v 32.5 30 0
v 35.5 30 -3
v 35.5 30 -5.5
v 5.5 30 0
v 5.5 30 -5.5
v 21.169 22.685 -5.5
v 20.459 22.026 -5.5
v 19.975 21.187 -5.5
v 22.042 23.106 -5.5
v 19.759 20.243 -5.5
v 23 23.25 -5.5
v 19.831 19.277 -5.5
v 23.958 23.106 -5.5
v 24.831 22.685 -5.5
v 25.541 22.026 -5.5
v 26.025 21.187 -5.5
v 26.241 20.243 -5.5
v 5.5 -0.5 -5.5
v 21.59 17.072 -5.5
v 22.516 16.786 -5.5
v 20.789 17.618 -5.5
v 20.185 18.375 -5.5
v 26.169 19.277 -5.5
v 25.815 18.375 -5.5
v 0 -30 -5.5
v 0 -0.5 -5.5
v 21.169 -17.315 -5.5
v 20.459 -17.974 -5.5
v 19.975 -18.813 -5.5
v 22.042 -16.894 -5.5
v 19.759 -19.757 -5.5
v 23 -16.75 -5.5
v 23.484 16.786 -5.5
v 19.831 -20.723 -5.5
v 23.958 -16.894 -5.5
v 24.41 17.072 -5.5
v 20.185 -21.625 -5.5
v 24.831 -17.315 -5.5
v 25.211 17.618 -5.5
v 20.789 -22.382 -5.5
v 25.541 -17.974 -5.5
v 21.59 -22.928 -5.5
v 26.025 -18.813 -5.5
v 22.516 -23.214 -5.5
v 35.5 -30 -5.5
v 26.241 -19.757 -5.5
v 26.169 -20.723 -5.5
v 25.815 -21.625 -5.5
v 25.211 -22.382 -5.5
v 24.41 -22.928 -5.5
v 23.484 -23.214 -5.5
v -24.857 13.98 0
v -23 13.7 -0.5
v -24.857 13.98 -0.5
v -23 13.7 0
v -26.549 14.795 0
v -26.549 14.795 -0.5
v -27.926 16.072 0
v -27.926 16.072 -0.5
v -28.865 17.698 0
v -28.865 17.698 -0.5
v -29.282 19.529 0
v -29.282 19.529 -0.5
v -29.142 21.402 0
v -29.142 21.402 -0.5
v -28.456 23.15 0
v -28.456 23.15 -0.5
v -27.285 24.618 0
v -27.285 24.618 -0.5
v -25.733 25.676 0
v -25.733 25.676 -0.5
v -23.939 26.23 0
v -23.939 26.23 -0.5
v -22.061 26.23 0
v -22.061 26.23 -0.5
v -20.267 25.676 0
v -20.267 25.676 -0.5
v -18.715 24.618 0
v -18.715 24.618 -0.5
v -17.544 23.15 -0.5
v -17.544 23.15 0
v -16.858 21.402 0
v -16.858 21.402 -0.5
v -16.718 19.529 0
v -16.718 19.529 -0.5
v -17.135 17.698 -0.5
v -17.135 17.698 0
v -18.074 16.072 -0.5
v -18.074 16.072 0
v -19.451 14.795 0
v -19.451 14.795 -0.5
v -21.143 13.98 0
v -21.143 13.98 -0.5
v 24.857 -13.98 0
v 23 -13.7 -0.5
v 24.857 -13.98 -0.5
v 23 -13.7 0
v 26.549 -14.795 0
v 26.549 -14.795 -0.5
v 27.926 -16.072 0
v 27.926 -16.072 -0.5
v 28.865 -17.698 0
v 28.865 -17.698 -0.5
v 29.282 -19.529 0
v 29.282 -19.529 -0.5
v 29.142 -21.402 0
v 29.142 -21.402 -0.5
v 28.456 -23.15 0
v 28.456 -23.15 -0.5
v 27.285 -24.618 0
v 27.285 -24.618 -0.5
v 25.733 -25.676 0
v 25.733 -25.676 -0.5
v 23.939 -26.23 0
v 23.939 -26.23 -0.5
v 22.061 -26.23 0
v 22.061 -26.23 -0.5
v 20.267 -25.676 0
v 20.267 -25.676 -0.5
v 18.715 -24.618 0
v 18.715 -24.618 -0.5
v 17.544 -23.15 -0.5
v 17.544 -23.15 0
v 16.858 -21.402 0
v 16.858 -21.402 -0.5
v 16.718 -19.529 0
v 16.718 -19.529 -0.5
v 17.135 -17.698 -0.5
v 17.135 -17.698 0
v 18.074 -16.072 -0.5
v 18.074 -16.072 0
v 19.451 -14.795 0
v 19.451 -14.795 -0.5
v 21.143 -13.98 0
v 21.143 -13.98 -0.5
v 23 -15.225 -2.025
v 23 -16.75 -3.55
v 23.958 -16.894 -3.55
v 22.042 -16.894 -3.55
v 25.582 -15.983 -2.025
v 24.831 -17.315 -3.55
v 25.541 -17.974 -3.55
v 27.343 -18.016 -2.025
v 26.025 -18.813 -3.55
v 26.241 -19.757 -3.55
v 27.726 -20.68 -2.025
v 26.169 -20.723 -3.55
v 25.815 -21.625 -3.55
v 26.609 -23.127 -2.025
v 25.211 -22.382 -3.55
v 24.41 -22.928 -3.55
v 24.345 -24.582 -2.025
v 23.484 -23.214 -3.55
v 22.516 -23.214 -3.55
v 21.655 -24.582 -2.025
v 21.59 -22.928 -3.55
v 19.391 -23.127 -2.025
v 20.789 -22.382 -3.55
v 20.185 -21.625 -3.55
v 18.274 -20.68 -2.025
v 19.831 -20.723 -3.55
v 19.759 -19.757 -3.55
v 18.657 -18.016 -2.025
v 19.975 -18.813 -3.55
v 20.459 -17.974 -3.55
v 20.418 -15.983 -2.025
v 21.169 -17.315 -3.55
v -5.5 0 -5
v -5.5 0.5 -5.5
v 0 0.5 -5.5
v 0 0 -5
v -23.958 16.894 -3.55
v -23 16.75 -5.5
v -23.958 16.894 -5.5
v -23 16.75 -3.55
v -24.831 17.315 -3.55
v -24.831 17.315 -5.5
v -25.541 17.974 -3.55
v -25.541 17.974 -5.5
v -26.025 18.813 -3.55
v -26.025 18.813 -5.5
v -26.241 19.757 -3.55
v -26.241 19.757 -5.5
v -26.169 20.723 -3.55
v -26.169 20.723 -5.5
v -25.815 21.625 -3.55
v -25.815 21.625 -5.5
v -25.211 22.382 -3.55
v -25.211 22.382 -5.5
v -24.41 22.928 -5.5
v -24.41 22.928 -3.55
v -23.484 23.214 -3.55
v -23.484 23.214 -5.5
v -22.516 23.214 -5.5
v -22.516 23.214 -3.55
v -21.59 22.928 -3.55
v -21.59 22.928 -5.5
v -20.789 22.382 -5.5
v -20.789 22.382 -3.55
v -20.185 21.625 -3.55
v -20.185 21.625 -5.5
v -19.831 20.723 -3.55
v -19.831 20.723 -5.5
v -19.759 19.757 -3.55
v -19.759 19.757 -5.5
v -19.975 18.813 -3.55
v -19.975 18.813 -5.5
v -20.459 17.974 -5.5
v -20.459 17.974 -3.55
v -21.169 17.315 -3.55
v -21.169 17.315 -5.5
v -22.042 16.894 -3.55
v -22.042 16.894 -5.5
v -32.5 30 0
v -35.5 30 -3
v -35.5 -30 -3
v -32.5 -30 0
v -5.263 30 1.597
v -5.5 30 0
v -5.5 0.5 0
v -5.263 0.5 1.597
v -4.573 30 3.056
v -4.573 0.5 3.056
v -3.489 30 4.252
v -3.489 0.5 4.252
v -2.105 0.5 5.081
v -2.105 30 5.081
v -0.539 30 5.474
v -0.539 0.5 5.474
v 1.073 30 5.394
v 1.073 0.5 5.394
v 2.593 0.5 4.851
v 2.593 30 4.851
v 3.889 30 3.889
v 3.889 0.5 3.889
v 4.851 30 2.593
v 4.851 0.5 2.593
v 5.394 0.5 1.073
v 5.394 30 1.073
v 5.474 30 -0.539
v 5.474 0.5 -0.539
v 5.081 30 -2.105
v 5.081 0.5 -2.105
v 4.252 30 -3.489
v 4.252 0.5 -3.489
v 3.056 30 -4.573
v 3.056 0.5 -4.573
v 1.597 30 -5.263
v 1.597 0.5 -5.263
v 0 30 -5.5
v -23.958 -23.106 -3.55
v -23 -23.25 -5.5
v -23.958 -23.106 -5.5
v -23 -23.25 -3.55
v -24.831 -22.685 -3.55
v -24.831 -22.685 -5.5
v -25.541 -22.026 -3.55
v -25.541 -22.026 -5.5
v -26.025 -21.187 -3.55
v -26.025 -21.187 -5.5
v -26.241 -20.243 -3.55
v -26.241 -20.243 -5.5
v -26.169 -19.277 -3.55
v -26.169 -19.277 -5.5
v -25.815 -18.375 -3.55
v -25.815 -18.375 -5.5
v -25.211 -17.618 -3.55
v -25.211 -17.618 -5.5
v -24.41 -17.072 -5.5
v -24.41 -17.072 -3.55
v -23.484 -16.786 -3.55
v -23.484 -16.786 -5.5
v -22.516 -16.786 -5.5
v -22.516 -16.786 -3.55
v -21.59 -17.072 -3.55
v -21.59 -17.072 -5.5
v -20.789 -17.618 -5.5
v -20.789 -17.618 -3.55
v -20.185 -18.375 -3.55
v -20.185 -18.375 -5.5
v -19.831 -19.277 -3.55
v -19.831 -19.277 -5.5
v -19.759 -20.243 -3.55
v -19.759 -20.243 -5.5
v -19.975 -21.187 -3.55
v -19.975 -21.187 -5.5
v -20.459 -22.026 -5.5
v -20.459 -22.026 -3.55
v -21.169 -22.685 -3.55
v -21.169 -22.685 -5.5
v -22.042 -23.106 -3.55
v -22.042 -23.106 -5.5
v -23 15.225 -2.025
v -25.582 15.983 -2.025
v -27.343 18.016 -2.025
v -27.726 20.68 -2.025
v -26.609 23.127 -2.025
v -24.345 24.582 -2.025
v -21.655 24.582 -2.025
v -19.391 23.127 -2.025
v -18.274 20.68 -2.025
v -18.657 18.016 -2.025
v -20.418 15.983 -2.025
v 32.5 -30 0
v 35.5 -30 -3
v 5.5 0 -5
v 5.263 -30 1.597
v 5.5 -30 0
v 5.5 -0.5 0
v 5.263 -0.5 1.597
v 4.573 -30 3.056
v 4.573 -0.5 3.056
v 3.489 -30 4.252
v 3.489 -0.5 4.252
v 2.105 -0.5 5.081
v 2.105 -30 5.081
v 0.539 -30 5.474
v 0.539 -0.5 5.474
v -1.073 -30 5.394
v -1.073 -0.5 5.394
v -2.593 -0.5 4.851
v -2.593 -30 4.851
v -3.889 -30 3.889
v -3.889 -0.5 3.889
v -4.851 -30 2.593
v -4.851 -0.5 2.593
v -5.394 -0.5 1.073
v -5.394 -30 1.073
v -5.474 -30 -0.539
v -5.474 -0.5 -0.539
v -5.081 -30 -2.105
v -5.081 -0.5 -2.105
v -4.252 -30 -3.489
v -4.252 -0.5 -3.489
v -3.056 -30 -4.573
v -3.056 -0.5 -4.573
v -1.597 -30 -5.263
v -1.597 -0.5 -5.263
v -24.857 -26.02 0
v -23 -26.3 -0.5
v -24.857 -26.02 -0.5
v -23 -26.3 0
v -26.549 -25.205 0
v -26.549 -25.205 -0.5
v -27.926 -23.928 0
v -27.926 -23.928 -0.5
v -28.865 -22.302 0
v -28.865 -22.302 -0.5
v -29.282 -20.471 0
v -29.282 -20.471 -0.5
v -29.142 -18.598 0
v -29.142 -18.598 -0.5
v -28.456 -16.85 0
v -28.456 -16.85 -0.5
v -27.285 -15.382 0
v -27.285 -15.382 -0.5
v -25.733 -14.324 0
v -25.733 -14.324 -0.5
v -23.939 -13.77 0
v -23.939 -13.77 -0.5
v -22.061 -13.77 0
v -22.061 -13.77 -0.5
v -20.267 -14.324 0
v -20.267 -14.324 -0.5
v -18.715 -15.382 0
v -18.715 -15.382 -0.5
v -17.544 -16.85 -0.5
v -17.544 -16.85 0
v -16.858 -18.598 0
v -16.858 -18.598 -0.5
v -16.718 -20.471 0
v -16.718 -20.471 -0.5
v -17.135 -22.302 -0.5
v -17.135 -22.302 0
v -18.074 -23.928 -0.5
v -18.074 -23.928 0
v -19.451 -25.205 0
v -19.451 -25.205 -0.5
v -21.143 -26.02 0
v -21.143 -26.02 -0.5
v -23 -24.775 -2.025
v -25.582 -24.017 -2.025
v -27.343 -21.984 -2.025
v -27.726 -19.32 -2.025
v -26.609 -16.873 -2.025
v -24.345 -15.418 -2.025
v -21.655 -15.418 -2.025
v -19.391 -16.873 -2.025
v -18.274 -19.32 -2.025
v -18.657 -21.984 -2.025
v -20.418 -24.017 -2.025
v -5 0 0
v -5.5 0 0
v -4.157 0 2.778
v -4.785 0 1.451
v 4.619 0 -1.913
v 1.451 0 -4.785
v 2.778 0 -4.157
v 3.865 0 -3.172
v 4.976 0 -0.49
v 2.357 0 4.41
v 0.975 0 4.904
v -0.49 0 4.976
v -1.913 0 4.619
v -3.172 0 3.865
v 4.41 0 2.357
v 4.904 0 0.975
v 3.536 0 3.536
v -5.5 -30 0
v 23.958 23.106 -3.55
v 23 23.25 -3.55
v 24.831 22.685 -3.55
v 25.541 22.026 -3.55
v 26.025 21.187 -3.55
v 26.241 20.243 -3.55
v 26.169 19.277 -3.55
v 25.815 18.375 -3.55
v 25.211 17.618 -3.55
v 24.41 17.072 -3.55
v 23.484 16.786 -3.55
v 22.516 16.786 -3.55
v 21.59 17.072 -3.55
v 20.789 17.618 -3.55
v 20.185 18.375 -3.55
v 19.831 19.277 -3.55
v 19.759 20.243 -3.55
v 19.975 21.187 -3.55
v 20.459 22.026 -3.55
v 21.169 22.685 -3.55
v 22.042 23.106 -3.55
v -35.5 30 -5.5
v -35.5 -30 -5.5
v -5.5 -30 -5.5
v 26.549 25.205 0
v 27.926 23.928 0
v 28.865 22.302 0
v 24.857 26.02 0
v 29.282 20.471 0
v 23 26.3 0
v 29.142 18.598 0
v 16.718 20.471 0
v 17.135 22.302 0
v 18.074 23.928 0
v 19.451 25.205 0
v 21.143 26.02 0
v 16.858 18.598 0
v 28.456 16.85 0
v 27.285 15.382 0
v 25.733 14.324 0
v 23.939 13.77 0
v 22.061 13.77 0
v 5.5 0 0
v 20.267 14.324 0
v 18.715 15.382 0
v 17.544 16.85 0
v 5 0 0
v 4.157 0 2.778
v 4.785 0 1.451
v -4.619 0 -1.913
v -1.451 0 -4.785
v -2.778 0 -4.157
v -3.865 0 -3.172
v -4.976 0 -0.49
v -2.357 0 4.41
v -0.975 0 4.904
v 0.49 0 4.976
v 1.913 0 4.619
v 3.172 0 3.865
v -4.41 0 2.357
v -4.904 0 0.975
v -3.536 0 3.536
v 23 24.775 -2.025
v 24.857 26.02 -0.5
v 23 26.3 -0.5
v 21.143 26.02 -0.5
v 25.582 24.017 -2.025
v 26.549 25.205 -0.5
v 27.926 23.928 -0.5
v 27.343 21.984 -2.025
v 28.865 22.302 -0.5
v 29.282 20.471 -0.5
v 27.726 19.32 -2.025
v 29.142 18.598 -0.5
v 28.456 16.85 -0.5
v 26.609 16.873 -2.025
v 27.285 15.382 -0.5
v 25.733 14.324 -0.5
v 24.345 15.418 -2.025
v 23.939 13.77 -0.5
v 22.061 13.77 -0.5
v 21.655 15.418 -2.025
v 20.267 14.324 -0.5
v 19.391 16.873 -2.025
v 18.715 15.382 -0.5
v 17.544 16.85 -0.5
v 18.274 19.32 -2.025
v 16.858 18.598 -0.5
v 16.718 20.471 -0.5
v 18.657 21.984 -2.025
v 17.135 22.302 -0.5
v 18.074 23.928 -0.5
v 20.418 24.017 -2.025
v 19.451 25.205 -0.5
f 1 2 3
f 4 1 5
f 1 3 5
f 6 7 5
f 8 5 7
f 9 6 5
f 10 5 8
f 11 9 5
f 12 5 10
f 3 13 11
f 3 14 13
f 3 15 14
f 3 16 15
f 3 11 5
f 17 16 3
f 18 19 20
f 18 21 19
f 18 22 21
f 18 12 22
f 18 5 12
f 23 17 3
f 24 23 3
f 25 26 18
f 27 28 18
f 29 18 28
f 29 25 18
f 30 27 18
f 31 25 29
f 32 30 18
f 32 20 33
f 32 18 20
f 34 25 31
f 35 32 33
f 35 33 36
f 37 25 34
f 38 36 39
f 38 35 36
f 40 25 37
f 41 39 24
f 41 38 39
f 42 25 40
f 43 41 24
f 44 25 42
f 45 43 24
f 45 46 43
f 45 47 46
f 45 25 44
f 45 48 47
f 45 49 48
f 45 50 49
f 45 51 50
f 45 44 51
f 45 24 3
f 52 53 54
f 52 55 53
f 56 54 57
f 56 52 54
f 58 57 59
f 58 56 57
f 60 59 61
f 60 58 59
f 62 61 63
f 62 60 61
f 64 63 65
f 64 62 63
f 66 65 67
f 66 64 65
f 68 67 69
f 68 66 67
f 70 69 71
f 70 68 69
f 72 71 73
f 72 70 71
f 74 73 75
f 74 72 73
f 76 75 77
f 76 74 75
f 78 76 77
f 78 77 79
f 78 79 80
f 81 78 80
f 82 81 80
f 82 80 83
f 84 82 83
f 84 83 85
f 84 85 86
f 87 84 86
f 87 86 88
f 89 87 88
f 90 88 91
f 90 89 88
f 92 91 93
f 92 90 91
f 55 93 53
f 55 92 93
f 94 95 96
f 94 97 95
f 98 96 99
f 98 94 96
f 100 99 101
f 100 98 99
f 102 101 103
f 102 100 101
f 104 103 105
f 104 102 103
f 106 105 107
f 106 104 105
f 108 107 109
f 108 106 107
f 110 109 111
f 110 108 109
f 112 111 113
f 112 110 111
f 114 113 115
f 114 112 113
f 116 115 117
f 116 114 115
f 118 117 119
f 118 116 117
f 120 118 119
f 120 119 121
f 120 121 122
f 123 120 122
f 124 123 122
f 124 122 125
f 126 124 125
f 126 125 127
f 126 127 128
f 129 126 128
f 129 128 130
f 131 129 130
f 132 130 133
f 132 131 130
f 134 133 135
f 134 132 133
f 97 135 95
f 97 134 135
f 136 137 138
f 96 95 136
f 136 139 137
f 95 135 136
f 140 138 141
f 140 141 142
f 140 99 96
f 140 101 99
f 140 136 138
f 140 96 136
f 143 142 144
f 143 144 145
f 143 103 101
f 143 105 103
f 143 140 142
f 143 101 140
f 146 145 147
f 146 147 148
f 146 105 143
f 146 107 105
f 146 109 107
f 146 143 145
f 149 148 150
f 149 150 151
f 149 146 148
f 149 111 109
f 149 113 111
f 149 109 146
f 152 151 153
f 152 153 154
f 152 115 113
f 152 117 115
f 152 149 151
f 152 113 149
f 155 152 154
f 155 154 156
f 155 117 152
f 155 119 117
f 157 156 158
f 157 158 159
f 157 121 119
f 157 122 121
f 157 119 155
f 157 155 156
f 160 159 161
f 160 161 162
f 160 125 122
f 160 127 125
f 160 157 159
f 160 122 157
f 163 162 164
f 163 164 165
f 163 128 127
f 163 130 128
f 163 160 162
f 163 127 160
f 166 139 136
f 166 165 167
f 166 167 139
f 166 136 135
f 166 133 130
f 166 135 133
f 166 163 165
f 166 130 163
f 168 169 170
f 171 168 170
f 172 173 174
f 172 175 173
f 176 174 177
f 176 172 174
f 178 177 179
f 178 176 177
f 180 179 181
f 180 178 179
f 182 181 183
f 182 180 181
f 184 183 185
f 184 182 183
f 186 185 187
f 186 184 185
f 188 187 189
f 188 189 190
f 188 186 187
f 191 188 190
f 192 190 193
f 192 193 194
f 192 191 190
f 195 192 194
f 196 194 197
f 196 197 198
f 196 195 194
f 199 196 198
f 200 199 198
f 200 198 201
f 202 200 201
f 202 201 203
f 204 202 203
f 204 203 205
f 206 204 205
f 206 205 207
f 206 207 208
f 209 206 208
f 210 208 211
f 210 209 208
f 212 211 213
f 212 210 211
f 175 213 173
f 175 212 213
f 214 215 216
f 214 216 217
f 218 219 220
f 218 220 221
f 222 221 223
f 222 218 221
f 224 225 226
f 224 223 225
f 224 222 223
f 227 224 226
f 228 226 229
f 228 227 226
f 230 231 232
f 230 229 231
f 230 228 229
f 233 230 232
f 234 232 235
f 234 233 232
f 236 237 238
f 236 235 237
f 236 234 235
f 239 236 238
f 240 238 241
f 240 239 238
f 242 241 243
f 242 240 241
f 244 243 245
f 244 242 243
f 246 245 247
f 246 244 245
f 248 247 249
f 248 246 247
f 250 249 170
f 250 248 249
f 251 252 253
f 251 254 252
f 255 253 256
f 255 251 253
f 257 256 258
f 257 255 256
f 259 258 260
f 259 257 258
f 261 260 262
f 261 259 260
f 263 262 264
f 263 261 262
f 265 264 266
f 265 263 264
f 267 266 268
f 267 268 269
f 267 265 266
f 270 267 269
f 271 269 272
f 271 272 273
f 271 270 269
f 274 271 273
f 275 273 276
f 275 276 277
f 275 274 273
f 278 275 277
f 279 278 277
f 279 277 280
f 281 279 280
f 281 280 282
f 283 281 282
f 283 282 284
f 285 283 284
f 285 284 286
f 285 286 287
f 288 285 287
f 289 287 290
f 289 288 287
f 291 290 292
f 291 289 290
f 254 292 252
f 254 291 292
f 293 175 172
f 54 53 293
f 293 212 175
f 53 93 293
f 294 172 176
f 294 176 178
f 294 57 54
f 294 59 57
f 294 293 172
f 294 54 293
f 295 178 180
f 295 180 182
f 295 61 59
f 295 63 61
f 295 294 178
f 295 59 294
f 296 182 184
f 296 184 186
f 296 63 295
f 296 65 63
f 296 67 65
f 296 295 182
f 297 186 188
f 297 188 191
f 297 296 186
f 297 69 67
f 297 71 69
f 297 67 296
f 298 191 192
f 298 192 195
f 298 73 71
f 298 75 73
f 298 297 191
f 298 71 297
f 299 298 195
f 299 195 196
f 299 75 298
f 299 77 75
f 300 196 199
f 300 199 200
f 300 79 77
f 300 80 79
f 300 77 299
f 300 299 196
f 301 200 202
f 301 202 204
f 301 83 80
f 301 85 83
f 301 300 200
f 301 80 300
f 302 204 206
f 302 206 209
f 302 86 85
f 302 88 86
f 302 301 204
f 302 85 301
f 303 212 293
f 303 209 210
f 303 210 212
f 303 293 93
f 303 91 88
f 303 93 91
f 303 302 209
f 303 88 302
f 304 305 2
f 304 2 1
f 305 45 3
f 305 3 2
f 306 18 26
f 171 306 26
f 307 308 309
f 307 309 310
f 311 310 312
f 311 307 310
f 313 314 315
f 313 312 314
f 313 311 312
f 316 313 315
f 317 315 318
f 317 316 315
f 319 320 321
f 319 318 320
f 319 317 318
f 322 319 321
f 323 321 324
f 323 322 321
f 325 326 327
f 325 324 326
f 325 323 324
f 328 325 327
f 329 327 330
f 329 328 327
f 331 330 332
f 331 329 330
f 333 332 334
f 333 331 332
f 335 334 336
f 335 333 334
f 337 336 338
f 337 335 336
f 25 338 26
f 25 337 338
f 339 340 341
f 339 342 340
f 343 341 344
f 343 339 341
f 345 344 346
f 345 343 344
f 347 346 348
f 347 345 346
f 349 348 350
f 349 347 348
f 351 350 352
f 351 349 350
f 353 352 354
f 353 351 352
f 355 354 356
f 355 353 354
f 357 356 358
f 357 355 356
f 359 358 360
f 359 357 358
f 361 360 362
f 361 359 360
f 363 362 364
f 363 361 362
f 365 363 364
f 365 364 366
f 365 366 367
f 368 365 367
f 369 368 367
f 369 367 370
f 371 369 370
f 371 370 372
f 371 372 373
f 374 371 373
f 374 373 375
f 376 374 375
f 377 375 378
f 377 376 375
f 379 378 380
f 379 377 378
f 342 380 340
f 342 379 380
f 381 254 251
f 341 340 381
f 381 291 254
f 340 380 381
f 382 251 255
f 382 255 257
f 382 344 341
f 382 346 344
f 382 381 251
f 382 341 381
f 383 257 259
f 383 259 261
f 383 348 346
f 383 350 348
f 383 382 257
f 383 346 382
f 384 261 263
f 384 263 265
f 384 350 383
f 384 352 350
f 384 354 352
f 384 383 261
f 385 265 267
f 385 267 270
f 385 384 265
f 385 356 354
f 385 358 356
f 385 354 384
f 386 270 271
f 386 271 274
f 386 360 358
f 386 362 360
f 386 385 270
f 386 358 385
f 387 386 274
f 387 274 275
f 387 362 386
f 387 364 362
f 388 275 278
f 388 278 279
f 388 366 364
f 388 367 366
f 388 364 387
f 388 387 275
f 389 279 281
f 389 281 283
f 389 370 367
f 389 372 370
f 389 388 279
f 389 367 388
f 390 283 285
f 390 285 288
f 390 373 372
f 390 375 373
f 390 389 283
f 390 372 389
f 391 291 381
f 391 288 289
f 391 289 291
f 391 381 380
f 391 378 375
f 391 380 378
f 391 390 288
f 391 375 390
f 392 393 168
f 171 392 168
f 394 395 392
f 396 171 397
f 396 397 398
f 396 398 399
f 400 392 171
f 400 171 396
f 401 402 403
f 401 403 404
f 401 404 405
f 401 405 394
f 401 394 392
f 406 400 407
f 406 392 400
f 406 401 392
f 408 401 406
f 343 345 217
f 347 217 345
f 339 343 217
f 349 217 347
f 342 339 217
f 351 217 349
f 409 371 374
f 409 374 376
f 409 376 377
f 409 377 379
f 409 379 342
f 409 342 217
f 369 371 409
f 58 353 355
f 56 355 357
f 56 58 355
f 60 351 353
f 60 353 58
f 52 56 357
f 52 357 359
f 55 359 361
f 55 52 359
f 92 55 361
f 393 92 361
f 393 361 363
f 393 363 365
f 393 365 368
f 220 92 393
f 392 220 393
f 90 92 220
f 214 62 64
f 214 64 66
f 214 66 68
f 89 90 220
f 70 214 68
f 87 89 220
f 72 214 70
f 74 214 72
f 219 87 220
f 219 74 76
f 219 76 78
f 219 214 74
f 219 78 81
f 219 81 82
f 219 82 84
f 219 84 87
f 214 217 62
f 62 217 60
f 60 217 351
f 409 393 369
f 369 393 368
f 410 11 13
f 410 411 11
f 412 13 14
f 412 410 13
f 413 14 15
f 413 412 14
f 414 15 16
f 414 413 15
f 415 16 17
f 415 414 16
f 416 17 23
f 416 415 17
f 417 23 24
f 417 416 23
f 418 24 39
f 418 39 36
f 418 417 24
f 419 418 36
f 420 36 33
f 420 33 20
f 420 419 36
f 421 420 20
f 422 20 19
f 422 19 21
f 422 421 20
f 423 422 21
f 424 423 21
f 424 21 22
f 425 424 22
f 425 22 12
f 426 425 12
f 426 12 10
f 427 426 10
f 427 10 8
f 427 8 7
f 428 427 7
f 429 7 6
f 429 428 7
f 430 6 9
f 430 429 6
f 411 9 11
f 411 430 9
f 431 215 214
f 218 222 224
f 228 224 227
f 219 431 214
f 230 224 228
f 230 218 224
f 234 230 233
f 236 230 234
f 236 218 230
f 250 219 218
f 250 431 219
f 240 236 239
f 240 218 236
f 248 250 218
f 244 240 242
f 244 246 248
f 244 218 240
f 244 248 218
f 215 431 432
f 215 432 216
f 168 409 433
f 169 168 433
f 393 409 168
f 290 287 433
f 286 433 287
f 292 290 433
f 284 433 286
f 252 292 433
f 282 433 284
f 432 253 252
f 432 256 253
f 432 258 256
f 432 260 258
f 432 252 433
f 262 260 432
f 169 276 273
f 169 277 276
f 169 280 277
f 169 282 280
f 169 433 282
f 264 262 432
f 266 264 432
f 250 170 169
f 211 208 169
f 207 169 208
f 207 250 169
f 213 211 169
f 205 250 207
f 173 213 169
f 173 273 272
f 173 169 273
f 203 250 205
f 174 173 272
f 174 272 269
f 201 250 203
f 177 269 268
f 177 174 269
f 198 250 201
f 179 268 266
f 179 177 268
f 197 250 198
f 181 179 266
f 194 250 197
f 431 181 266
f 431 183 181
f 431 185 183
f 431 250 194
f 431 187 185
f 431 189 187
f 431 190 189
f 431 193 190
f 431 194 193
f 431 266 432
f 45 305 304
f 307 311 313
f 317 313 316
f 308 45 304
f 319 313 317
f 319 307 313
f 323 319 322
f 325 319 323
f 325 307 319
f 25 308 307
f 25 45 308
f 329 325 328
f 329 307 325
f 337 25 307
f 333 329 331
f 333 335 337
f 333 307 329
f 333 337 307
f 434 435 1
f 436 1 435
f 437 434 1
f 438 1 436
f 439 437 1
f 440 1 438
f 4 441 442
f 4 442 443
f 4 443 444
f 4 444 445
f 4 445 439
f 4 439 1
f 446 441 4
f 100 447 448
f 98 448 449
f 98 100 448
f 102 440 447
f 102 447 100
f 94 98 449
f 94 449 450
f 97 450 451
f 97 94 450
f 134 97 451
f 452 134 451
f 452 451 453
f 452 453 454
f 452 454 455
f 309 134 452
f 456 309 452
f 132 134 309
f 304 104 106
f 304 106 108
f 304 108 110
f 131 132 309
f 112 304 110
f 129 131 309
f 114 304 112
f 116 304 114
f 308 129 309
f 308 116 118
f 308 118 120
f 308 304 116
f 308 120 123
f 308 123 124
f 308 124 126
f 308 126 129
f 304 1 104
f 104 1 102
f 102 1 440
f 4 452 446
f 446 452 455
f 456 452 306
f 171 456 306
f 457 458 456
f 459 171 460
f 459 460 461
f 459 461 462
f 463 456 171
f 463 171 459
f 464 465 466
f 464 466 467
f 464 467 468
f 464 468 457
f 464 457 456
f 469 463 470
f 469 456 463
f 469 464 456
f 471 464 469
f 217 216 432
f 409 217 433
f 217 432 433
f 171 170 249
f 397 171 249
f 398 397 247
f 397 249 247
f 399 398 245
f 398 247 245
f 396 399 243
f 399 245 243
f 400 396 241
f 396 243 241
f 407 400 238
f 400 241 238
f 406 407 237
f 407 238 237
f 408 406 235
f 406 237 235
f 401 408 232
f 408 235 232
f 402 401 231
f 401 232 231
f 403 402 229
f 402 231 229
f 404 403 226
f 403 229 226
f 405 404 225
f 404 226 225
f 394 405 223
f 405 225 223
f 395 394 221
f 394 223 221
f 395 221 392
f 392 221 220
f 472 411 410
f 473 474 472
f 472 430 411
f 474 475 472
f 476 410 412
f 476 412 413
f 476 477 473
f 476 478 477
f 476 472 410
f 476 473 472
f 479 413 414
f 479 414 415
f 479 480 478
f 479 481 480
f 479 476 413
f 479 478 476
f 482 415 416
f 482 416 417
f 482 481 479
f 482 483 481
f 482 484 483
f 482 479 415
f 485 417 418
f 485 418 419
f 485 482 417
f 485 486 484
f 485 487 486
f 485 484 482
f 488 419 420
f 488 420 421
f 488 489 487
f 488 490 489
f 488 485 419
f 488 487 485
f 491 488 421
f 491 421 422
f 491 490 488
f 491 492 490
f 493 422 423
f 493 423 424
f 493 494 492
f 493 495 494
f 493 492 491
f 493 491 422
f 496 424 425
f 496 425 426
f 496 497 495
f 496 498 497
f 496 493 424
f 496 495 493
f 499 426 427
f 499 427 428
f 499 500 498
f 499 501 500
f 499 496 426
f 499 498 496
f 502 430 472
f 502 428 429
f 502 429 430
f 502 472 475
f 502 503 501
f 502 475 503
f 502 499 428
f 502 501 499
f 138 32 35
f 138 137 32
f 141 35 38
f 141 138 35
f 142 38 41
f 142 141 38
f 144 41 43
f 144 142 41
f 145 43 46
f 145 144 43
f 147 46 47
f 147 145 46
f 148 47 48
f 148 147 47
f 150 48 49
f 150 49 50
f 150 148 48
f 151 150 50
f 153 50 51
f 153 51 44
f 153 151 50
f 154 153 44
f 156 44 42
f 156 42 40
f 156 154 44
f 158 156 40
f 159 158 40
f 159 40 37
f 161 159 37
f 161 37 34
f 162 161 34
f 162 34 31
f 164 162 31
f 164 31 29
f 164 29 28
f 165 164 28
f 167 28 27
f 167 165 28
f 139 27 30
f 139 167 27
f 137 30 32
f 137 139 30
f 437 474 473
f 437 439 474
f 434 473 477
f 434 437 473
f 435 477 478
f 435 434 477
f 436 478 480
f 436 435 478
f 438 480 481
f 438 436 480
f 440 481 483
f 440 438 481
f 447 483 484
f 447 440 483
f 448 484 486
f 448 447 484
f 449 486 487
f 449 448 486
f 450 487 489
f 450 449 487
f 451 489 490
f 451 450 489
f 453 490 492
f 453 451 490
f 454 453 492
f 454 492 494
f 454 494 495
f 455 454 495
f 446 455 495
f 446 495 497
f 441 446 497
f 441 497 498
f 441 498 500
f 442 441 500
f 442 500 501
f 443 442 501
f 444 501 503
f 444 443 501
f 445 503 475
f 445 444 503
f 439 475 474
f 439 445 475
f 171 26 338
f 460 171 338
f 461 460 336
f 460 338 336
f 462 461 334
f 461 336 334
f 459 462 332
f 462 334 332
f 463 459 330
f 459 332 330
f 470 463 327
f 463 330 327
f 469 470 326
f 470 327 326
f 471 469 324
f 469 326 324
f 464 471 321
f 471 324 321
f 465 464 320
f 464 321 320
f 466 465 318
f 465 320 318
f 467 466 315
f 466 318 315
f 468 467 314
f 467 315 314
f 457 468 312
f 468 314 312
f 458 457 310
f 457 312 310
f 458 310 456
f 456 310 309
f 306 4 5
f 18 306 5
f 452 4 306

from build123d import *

# Parameters (mm, degrees)
EXTRUDE_1_DEPTH            = 30
SKETCH_3_W                 = 11
SKETCH_3_H                 = 30
CUT_EXTRUDE_1_DEPTH        = 6.5
CUT_EXTRUDE_1_DEPTH_BACK   = 6.5
HOLE_WIZARD_M61_AT_2_COUNT = 2
HOLE_WIZARD_M61_AT_2_PITCH = 40
CHAMFER_1_SIZE             = 0.5
PATTERN_CIRCULAR_1_COUNT   = 2


with BuildPart() as part:
    # Эскиз1 → Бобышка-Вытянуть1 (new body, symmetric)
    with BuildSketch(Plane(origin=(0, 0, 0), x_dir=(1, 0, 0), z_dir=(0, 1, 0))):
        with BuildLine():
            Line((0, 5.5), (-35.5, 5.5))
            Line((-35.5, 5.5), (-35.5, 3))
            Line((-35.5, 3), (-32.5, 0))
            Line((-32.5, 0), (-5.5, 0))
            ThreePointArc((-5.5, 0), (3.889087297, -3.889087297), (0, 5.5))
        make_face()
    extrude(amount=EXTRUDE_1_DEPTH, both=True)

    # Эскиз3 → Вырез-Вытянуть1 (cut, two sides)
    with BuildSketch(Plane.XY) as cut_extrude_1_sk:
        with Locations((0, -15)):
            Rectangle(SKETCH_3_W, SKETCH_3_H)
    extrude(amount=CUT_EXTRUDE_1_DEPTH, mode=Mode.SUBTRACT)
    extrude(cut_extrude_1_sk.sketch, amount=-CUT_EXTRUDE_1_DEPTH_BACK, mode=Mode.SUBTRACT)

    # Эскиз6 → Зенковка для винта с полупотайной головкой M61 (revolve, cut)
    with BuildSketch(Plane(origin=(-23, 20, 0), x_dir=(0, -1, 0), z_dir=(1, 0, 0))):
        Polygon((0, 0), (0, 5.5), (3.25, 5.5), (3.25, 3.55), (6.3, 0.5), (6.3, 0), align=None)
    hole_wizard_m61 = revolve(axis=Axis((-23, 20, 6.35), (0, 0, -1)), mode=Mode.SUBTRACT)

    # Зенковка для винта с полупотайной головкой M61 at 2: Зенковка для винта с полупотайной головкой M61 ×2
    with Locations(*[(0, -i * HOLE_WIZARD_M61_AT_2_PITCH, 0) for i in range(1, HOLE_WIZARD_M61_AT_2_COUNT)]):
        add(hole_wizard_m61, mode=Mode.SUBTRACT)

    # Фаска1
    chamfer_1_edges = [part.edges().sort_by_distance(p)[0] for p in [
        (3.889087297, 0, 3.889087297),
        (-2.75, 0, -5.5),
    ]]
    chamfer(chamfer_1_edges, length=CHAMFER_1_SIZE)


with BuildPart() as pattern_circular_1_1:
    # Круговой массив1: pattern copy
    add(part.part.rotate(Axis((0, 0, 0), (0, 0, 1)), 1 * 360 / PATTERN_CIRCULAR_1_COUNT))


solid = Compound([part.part, pattern_circular_1_1.part])
